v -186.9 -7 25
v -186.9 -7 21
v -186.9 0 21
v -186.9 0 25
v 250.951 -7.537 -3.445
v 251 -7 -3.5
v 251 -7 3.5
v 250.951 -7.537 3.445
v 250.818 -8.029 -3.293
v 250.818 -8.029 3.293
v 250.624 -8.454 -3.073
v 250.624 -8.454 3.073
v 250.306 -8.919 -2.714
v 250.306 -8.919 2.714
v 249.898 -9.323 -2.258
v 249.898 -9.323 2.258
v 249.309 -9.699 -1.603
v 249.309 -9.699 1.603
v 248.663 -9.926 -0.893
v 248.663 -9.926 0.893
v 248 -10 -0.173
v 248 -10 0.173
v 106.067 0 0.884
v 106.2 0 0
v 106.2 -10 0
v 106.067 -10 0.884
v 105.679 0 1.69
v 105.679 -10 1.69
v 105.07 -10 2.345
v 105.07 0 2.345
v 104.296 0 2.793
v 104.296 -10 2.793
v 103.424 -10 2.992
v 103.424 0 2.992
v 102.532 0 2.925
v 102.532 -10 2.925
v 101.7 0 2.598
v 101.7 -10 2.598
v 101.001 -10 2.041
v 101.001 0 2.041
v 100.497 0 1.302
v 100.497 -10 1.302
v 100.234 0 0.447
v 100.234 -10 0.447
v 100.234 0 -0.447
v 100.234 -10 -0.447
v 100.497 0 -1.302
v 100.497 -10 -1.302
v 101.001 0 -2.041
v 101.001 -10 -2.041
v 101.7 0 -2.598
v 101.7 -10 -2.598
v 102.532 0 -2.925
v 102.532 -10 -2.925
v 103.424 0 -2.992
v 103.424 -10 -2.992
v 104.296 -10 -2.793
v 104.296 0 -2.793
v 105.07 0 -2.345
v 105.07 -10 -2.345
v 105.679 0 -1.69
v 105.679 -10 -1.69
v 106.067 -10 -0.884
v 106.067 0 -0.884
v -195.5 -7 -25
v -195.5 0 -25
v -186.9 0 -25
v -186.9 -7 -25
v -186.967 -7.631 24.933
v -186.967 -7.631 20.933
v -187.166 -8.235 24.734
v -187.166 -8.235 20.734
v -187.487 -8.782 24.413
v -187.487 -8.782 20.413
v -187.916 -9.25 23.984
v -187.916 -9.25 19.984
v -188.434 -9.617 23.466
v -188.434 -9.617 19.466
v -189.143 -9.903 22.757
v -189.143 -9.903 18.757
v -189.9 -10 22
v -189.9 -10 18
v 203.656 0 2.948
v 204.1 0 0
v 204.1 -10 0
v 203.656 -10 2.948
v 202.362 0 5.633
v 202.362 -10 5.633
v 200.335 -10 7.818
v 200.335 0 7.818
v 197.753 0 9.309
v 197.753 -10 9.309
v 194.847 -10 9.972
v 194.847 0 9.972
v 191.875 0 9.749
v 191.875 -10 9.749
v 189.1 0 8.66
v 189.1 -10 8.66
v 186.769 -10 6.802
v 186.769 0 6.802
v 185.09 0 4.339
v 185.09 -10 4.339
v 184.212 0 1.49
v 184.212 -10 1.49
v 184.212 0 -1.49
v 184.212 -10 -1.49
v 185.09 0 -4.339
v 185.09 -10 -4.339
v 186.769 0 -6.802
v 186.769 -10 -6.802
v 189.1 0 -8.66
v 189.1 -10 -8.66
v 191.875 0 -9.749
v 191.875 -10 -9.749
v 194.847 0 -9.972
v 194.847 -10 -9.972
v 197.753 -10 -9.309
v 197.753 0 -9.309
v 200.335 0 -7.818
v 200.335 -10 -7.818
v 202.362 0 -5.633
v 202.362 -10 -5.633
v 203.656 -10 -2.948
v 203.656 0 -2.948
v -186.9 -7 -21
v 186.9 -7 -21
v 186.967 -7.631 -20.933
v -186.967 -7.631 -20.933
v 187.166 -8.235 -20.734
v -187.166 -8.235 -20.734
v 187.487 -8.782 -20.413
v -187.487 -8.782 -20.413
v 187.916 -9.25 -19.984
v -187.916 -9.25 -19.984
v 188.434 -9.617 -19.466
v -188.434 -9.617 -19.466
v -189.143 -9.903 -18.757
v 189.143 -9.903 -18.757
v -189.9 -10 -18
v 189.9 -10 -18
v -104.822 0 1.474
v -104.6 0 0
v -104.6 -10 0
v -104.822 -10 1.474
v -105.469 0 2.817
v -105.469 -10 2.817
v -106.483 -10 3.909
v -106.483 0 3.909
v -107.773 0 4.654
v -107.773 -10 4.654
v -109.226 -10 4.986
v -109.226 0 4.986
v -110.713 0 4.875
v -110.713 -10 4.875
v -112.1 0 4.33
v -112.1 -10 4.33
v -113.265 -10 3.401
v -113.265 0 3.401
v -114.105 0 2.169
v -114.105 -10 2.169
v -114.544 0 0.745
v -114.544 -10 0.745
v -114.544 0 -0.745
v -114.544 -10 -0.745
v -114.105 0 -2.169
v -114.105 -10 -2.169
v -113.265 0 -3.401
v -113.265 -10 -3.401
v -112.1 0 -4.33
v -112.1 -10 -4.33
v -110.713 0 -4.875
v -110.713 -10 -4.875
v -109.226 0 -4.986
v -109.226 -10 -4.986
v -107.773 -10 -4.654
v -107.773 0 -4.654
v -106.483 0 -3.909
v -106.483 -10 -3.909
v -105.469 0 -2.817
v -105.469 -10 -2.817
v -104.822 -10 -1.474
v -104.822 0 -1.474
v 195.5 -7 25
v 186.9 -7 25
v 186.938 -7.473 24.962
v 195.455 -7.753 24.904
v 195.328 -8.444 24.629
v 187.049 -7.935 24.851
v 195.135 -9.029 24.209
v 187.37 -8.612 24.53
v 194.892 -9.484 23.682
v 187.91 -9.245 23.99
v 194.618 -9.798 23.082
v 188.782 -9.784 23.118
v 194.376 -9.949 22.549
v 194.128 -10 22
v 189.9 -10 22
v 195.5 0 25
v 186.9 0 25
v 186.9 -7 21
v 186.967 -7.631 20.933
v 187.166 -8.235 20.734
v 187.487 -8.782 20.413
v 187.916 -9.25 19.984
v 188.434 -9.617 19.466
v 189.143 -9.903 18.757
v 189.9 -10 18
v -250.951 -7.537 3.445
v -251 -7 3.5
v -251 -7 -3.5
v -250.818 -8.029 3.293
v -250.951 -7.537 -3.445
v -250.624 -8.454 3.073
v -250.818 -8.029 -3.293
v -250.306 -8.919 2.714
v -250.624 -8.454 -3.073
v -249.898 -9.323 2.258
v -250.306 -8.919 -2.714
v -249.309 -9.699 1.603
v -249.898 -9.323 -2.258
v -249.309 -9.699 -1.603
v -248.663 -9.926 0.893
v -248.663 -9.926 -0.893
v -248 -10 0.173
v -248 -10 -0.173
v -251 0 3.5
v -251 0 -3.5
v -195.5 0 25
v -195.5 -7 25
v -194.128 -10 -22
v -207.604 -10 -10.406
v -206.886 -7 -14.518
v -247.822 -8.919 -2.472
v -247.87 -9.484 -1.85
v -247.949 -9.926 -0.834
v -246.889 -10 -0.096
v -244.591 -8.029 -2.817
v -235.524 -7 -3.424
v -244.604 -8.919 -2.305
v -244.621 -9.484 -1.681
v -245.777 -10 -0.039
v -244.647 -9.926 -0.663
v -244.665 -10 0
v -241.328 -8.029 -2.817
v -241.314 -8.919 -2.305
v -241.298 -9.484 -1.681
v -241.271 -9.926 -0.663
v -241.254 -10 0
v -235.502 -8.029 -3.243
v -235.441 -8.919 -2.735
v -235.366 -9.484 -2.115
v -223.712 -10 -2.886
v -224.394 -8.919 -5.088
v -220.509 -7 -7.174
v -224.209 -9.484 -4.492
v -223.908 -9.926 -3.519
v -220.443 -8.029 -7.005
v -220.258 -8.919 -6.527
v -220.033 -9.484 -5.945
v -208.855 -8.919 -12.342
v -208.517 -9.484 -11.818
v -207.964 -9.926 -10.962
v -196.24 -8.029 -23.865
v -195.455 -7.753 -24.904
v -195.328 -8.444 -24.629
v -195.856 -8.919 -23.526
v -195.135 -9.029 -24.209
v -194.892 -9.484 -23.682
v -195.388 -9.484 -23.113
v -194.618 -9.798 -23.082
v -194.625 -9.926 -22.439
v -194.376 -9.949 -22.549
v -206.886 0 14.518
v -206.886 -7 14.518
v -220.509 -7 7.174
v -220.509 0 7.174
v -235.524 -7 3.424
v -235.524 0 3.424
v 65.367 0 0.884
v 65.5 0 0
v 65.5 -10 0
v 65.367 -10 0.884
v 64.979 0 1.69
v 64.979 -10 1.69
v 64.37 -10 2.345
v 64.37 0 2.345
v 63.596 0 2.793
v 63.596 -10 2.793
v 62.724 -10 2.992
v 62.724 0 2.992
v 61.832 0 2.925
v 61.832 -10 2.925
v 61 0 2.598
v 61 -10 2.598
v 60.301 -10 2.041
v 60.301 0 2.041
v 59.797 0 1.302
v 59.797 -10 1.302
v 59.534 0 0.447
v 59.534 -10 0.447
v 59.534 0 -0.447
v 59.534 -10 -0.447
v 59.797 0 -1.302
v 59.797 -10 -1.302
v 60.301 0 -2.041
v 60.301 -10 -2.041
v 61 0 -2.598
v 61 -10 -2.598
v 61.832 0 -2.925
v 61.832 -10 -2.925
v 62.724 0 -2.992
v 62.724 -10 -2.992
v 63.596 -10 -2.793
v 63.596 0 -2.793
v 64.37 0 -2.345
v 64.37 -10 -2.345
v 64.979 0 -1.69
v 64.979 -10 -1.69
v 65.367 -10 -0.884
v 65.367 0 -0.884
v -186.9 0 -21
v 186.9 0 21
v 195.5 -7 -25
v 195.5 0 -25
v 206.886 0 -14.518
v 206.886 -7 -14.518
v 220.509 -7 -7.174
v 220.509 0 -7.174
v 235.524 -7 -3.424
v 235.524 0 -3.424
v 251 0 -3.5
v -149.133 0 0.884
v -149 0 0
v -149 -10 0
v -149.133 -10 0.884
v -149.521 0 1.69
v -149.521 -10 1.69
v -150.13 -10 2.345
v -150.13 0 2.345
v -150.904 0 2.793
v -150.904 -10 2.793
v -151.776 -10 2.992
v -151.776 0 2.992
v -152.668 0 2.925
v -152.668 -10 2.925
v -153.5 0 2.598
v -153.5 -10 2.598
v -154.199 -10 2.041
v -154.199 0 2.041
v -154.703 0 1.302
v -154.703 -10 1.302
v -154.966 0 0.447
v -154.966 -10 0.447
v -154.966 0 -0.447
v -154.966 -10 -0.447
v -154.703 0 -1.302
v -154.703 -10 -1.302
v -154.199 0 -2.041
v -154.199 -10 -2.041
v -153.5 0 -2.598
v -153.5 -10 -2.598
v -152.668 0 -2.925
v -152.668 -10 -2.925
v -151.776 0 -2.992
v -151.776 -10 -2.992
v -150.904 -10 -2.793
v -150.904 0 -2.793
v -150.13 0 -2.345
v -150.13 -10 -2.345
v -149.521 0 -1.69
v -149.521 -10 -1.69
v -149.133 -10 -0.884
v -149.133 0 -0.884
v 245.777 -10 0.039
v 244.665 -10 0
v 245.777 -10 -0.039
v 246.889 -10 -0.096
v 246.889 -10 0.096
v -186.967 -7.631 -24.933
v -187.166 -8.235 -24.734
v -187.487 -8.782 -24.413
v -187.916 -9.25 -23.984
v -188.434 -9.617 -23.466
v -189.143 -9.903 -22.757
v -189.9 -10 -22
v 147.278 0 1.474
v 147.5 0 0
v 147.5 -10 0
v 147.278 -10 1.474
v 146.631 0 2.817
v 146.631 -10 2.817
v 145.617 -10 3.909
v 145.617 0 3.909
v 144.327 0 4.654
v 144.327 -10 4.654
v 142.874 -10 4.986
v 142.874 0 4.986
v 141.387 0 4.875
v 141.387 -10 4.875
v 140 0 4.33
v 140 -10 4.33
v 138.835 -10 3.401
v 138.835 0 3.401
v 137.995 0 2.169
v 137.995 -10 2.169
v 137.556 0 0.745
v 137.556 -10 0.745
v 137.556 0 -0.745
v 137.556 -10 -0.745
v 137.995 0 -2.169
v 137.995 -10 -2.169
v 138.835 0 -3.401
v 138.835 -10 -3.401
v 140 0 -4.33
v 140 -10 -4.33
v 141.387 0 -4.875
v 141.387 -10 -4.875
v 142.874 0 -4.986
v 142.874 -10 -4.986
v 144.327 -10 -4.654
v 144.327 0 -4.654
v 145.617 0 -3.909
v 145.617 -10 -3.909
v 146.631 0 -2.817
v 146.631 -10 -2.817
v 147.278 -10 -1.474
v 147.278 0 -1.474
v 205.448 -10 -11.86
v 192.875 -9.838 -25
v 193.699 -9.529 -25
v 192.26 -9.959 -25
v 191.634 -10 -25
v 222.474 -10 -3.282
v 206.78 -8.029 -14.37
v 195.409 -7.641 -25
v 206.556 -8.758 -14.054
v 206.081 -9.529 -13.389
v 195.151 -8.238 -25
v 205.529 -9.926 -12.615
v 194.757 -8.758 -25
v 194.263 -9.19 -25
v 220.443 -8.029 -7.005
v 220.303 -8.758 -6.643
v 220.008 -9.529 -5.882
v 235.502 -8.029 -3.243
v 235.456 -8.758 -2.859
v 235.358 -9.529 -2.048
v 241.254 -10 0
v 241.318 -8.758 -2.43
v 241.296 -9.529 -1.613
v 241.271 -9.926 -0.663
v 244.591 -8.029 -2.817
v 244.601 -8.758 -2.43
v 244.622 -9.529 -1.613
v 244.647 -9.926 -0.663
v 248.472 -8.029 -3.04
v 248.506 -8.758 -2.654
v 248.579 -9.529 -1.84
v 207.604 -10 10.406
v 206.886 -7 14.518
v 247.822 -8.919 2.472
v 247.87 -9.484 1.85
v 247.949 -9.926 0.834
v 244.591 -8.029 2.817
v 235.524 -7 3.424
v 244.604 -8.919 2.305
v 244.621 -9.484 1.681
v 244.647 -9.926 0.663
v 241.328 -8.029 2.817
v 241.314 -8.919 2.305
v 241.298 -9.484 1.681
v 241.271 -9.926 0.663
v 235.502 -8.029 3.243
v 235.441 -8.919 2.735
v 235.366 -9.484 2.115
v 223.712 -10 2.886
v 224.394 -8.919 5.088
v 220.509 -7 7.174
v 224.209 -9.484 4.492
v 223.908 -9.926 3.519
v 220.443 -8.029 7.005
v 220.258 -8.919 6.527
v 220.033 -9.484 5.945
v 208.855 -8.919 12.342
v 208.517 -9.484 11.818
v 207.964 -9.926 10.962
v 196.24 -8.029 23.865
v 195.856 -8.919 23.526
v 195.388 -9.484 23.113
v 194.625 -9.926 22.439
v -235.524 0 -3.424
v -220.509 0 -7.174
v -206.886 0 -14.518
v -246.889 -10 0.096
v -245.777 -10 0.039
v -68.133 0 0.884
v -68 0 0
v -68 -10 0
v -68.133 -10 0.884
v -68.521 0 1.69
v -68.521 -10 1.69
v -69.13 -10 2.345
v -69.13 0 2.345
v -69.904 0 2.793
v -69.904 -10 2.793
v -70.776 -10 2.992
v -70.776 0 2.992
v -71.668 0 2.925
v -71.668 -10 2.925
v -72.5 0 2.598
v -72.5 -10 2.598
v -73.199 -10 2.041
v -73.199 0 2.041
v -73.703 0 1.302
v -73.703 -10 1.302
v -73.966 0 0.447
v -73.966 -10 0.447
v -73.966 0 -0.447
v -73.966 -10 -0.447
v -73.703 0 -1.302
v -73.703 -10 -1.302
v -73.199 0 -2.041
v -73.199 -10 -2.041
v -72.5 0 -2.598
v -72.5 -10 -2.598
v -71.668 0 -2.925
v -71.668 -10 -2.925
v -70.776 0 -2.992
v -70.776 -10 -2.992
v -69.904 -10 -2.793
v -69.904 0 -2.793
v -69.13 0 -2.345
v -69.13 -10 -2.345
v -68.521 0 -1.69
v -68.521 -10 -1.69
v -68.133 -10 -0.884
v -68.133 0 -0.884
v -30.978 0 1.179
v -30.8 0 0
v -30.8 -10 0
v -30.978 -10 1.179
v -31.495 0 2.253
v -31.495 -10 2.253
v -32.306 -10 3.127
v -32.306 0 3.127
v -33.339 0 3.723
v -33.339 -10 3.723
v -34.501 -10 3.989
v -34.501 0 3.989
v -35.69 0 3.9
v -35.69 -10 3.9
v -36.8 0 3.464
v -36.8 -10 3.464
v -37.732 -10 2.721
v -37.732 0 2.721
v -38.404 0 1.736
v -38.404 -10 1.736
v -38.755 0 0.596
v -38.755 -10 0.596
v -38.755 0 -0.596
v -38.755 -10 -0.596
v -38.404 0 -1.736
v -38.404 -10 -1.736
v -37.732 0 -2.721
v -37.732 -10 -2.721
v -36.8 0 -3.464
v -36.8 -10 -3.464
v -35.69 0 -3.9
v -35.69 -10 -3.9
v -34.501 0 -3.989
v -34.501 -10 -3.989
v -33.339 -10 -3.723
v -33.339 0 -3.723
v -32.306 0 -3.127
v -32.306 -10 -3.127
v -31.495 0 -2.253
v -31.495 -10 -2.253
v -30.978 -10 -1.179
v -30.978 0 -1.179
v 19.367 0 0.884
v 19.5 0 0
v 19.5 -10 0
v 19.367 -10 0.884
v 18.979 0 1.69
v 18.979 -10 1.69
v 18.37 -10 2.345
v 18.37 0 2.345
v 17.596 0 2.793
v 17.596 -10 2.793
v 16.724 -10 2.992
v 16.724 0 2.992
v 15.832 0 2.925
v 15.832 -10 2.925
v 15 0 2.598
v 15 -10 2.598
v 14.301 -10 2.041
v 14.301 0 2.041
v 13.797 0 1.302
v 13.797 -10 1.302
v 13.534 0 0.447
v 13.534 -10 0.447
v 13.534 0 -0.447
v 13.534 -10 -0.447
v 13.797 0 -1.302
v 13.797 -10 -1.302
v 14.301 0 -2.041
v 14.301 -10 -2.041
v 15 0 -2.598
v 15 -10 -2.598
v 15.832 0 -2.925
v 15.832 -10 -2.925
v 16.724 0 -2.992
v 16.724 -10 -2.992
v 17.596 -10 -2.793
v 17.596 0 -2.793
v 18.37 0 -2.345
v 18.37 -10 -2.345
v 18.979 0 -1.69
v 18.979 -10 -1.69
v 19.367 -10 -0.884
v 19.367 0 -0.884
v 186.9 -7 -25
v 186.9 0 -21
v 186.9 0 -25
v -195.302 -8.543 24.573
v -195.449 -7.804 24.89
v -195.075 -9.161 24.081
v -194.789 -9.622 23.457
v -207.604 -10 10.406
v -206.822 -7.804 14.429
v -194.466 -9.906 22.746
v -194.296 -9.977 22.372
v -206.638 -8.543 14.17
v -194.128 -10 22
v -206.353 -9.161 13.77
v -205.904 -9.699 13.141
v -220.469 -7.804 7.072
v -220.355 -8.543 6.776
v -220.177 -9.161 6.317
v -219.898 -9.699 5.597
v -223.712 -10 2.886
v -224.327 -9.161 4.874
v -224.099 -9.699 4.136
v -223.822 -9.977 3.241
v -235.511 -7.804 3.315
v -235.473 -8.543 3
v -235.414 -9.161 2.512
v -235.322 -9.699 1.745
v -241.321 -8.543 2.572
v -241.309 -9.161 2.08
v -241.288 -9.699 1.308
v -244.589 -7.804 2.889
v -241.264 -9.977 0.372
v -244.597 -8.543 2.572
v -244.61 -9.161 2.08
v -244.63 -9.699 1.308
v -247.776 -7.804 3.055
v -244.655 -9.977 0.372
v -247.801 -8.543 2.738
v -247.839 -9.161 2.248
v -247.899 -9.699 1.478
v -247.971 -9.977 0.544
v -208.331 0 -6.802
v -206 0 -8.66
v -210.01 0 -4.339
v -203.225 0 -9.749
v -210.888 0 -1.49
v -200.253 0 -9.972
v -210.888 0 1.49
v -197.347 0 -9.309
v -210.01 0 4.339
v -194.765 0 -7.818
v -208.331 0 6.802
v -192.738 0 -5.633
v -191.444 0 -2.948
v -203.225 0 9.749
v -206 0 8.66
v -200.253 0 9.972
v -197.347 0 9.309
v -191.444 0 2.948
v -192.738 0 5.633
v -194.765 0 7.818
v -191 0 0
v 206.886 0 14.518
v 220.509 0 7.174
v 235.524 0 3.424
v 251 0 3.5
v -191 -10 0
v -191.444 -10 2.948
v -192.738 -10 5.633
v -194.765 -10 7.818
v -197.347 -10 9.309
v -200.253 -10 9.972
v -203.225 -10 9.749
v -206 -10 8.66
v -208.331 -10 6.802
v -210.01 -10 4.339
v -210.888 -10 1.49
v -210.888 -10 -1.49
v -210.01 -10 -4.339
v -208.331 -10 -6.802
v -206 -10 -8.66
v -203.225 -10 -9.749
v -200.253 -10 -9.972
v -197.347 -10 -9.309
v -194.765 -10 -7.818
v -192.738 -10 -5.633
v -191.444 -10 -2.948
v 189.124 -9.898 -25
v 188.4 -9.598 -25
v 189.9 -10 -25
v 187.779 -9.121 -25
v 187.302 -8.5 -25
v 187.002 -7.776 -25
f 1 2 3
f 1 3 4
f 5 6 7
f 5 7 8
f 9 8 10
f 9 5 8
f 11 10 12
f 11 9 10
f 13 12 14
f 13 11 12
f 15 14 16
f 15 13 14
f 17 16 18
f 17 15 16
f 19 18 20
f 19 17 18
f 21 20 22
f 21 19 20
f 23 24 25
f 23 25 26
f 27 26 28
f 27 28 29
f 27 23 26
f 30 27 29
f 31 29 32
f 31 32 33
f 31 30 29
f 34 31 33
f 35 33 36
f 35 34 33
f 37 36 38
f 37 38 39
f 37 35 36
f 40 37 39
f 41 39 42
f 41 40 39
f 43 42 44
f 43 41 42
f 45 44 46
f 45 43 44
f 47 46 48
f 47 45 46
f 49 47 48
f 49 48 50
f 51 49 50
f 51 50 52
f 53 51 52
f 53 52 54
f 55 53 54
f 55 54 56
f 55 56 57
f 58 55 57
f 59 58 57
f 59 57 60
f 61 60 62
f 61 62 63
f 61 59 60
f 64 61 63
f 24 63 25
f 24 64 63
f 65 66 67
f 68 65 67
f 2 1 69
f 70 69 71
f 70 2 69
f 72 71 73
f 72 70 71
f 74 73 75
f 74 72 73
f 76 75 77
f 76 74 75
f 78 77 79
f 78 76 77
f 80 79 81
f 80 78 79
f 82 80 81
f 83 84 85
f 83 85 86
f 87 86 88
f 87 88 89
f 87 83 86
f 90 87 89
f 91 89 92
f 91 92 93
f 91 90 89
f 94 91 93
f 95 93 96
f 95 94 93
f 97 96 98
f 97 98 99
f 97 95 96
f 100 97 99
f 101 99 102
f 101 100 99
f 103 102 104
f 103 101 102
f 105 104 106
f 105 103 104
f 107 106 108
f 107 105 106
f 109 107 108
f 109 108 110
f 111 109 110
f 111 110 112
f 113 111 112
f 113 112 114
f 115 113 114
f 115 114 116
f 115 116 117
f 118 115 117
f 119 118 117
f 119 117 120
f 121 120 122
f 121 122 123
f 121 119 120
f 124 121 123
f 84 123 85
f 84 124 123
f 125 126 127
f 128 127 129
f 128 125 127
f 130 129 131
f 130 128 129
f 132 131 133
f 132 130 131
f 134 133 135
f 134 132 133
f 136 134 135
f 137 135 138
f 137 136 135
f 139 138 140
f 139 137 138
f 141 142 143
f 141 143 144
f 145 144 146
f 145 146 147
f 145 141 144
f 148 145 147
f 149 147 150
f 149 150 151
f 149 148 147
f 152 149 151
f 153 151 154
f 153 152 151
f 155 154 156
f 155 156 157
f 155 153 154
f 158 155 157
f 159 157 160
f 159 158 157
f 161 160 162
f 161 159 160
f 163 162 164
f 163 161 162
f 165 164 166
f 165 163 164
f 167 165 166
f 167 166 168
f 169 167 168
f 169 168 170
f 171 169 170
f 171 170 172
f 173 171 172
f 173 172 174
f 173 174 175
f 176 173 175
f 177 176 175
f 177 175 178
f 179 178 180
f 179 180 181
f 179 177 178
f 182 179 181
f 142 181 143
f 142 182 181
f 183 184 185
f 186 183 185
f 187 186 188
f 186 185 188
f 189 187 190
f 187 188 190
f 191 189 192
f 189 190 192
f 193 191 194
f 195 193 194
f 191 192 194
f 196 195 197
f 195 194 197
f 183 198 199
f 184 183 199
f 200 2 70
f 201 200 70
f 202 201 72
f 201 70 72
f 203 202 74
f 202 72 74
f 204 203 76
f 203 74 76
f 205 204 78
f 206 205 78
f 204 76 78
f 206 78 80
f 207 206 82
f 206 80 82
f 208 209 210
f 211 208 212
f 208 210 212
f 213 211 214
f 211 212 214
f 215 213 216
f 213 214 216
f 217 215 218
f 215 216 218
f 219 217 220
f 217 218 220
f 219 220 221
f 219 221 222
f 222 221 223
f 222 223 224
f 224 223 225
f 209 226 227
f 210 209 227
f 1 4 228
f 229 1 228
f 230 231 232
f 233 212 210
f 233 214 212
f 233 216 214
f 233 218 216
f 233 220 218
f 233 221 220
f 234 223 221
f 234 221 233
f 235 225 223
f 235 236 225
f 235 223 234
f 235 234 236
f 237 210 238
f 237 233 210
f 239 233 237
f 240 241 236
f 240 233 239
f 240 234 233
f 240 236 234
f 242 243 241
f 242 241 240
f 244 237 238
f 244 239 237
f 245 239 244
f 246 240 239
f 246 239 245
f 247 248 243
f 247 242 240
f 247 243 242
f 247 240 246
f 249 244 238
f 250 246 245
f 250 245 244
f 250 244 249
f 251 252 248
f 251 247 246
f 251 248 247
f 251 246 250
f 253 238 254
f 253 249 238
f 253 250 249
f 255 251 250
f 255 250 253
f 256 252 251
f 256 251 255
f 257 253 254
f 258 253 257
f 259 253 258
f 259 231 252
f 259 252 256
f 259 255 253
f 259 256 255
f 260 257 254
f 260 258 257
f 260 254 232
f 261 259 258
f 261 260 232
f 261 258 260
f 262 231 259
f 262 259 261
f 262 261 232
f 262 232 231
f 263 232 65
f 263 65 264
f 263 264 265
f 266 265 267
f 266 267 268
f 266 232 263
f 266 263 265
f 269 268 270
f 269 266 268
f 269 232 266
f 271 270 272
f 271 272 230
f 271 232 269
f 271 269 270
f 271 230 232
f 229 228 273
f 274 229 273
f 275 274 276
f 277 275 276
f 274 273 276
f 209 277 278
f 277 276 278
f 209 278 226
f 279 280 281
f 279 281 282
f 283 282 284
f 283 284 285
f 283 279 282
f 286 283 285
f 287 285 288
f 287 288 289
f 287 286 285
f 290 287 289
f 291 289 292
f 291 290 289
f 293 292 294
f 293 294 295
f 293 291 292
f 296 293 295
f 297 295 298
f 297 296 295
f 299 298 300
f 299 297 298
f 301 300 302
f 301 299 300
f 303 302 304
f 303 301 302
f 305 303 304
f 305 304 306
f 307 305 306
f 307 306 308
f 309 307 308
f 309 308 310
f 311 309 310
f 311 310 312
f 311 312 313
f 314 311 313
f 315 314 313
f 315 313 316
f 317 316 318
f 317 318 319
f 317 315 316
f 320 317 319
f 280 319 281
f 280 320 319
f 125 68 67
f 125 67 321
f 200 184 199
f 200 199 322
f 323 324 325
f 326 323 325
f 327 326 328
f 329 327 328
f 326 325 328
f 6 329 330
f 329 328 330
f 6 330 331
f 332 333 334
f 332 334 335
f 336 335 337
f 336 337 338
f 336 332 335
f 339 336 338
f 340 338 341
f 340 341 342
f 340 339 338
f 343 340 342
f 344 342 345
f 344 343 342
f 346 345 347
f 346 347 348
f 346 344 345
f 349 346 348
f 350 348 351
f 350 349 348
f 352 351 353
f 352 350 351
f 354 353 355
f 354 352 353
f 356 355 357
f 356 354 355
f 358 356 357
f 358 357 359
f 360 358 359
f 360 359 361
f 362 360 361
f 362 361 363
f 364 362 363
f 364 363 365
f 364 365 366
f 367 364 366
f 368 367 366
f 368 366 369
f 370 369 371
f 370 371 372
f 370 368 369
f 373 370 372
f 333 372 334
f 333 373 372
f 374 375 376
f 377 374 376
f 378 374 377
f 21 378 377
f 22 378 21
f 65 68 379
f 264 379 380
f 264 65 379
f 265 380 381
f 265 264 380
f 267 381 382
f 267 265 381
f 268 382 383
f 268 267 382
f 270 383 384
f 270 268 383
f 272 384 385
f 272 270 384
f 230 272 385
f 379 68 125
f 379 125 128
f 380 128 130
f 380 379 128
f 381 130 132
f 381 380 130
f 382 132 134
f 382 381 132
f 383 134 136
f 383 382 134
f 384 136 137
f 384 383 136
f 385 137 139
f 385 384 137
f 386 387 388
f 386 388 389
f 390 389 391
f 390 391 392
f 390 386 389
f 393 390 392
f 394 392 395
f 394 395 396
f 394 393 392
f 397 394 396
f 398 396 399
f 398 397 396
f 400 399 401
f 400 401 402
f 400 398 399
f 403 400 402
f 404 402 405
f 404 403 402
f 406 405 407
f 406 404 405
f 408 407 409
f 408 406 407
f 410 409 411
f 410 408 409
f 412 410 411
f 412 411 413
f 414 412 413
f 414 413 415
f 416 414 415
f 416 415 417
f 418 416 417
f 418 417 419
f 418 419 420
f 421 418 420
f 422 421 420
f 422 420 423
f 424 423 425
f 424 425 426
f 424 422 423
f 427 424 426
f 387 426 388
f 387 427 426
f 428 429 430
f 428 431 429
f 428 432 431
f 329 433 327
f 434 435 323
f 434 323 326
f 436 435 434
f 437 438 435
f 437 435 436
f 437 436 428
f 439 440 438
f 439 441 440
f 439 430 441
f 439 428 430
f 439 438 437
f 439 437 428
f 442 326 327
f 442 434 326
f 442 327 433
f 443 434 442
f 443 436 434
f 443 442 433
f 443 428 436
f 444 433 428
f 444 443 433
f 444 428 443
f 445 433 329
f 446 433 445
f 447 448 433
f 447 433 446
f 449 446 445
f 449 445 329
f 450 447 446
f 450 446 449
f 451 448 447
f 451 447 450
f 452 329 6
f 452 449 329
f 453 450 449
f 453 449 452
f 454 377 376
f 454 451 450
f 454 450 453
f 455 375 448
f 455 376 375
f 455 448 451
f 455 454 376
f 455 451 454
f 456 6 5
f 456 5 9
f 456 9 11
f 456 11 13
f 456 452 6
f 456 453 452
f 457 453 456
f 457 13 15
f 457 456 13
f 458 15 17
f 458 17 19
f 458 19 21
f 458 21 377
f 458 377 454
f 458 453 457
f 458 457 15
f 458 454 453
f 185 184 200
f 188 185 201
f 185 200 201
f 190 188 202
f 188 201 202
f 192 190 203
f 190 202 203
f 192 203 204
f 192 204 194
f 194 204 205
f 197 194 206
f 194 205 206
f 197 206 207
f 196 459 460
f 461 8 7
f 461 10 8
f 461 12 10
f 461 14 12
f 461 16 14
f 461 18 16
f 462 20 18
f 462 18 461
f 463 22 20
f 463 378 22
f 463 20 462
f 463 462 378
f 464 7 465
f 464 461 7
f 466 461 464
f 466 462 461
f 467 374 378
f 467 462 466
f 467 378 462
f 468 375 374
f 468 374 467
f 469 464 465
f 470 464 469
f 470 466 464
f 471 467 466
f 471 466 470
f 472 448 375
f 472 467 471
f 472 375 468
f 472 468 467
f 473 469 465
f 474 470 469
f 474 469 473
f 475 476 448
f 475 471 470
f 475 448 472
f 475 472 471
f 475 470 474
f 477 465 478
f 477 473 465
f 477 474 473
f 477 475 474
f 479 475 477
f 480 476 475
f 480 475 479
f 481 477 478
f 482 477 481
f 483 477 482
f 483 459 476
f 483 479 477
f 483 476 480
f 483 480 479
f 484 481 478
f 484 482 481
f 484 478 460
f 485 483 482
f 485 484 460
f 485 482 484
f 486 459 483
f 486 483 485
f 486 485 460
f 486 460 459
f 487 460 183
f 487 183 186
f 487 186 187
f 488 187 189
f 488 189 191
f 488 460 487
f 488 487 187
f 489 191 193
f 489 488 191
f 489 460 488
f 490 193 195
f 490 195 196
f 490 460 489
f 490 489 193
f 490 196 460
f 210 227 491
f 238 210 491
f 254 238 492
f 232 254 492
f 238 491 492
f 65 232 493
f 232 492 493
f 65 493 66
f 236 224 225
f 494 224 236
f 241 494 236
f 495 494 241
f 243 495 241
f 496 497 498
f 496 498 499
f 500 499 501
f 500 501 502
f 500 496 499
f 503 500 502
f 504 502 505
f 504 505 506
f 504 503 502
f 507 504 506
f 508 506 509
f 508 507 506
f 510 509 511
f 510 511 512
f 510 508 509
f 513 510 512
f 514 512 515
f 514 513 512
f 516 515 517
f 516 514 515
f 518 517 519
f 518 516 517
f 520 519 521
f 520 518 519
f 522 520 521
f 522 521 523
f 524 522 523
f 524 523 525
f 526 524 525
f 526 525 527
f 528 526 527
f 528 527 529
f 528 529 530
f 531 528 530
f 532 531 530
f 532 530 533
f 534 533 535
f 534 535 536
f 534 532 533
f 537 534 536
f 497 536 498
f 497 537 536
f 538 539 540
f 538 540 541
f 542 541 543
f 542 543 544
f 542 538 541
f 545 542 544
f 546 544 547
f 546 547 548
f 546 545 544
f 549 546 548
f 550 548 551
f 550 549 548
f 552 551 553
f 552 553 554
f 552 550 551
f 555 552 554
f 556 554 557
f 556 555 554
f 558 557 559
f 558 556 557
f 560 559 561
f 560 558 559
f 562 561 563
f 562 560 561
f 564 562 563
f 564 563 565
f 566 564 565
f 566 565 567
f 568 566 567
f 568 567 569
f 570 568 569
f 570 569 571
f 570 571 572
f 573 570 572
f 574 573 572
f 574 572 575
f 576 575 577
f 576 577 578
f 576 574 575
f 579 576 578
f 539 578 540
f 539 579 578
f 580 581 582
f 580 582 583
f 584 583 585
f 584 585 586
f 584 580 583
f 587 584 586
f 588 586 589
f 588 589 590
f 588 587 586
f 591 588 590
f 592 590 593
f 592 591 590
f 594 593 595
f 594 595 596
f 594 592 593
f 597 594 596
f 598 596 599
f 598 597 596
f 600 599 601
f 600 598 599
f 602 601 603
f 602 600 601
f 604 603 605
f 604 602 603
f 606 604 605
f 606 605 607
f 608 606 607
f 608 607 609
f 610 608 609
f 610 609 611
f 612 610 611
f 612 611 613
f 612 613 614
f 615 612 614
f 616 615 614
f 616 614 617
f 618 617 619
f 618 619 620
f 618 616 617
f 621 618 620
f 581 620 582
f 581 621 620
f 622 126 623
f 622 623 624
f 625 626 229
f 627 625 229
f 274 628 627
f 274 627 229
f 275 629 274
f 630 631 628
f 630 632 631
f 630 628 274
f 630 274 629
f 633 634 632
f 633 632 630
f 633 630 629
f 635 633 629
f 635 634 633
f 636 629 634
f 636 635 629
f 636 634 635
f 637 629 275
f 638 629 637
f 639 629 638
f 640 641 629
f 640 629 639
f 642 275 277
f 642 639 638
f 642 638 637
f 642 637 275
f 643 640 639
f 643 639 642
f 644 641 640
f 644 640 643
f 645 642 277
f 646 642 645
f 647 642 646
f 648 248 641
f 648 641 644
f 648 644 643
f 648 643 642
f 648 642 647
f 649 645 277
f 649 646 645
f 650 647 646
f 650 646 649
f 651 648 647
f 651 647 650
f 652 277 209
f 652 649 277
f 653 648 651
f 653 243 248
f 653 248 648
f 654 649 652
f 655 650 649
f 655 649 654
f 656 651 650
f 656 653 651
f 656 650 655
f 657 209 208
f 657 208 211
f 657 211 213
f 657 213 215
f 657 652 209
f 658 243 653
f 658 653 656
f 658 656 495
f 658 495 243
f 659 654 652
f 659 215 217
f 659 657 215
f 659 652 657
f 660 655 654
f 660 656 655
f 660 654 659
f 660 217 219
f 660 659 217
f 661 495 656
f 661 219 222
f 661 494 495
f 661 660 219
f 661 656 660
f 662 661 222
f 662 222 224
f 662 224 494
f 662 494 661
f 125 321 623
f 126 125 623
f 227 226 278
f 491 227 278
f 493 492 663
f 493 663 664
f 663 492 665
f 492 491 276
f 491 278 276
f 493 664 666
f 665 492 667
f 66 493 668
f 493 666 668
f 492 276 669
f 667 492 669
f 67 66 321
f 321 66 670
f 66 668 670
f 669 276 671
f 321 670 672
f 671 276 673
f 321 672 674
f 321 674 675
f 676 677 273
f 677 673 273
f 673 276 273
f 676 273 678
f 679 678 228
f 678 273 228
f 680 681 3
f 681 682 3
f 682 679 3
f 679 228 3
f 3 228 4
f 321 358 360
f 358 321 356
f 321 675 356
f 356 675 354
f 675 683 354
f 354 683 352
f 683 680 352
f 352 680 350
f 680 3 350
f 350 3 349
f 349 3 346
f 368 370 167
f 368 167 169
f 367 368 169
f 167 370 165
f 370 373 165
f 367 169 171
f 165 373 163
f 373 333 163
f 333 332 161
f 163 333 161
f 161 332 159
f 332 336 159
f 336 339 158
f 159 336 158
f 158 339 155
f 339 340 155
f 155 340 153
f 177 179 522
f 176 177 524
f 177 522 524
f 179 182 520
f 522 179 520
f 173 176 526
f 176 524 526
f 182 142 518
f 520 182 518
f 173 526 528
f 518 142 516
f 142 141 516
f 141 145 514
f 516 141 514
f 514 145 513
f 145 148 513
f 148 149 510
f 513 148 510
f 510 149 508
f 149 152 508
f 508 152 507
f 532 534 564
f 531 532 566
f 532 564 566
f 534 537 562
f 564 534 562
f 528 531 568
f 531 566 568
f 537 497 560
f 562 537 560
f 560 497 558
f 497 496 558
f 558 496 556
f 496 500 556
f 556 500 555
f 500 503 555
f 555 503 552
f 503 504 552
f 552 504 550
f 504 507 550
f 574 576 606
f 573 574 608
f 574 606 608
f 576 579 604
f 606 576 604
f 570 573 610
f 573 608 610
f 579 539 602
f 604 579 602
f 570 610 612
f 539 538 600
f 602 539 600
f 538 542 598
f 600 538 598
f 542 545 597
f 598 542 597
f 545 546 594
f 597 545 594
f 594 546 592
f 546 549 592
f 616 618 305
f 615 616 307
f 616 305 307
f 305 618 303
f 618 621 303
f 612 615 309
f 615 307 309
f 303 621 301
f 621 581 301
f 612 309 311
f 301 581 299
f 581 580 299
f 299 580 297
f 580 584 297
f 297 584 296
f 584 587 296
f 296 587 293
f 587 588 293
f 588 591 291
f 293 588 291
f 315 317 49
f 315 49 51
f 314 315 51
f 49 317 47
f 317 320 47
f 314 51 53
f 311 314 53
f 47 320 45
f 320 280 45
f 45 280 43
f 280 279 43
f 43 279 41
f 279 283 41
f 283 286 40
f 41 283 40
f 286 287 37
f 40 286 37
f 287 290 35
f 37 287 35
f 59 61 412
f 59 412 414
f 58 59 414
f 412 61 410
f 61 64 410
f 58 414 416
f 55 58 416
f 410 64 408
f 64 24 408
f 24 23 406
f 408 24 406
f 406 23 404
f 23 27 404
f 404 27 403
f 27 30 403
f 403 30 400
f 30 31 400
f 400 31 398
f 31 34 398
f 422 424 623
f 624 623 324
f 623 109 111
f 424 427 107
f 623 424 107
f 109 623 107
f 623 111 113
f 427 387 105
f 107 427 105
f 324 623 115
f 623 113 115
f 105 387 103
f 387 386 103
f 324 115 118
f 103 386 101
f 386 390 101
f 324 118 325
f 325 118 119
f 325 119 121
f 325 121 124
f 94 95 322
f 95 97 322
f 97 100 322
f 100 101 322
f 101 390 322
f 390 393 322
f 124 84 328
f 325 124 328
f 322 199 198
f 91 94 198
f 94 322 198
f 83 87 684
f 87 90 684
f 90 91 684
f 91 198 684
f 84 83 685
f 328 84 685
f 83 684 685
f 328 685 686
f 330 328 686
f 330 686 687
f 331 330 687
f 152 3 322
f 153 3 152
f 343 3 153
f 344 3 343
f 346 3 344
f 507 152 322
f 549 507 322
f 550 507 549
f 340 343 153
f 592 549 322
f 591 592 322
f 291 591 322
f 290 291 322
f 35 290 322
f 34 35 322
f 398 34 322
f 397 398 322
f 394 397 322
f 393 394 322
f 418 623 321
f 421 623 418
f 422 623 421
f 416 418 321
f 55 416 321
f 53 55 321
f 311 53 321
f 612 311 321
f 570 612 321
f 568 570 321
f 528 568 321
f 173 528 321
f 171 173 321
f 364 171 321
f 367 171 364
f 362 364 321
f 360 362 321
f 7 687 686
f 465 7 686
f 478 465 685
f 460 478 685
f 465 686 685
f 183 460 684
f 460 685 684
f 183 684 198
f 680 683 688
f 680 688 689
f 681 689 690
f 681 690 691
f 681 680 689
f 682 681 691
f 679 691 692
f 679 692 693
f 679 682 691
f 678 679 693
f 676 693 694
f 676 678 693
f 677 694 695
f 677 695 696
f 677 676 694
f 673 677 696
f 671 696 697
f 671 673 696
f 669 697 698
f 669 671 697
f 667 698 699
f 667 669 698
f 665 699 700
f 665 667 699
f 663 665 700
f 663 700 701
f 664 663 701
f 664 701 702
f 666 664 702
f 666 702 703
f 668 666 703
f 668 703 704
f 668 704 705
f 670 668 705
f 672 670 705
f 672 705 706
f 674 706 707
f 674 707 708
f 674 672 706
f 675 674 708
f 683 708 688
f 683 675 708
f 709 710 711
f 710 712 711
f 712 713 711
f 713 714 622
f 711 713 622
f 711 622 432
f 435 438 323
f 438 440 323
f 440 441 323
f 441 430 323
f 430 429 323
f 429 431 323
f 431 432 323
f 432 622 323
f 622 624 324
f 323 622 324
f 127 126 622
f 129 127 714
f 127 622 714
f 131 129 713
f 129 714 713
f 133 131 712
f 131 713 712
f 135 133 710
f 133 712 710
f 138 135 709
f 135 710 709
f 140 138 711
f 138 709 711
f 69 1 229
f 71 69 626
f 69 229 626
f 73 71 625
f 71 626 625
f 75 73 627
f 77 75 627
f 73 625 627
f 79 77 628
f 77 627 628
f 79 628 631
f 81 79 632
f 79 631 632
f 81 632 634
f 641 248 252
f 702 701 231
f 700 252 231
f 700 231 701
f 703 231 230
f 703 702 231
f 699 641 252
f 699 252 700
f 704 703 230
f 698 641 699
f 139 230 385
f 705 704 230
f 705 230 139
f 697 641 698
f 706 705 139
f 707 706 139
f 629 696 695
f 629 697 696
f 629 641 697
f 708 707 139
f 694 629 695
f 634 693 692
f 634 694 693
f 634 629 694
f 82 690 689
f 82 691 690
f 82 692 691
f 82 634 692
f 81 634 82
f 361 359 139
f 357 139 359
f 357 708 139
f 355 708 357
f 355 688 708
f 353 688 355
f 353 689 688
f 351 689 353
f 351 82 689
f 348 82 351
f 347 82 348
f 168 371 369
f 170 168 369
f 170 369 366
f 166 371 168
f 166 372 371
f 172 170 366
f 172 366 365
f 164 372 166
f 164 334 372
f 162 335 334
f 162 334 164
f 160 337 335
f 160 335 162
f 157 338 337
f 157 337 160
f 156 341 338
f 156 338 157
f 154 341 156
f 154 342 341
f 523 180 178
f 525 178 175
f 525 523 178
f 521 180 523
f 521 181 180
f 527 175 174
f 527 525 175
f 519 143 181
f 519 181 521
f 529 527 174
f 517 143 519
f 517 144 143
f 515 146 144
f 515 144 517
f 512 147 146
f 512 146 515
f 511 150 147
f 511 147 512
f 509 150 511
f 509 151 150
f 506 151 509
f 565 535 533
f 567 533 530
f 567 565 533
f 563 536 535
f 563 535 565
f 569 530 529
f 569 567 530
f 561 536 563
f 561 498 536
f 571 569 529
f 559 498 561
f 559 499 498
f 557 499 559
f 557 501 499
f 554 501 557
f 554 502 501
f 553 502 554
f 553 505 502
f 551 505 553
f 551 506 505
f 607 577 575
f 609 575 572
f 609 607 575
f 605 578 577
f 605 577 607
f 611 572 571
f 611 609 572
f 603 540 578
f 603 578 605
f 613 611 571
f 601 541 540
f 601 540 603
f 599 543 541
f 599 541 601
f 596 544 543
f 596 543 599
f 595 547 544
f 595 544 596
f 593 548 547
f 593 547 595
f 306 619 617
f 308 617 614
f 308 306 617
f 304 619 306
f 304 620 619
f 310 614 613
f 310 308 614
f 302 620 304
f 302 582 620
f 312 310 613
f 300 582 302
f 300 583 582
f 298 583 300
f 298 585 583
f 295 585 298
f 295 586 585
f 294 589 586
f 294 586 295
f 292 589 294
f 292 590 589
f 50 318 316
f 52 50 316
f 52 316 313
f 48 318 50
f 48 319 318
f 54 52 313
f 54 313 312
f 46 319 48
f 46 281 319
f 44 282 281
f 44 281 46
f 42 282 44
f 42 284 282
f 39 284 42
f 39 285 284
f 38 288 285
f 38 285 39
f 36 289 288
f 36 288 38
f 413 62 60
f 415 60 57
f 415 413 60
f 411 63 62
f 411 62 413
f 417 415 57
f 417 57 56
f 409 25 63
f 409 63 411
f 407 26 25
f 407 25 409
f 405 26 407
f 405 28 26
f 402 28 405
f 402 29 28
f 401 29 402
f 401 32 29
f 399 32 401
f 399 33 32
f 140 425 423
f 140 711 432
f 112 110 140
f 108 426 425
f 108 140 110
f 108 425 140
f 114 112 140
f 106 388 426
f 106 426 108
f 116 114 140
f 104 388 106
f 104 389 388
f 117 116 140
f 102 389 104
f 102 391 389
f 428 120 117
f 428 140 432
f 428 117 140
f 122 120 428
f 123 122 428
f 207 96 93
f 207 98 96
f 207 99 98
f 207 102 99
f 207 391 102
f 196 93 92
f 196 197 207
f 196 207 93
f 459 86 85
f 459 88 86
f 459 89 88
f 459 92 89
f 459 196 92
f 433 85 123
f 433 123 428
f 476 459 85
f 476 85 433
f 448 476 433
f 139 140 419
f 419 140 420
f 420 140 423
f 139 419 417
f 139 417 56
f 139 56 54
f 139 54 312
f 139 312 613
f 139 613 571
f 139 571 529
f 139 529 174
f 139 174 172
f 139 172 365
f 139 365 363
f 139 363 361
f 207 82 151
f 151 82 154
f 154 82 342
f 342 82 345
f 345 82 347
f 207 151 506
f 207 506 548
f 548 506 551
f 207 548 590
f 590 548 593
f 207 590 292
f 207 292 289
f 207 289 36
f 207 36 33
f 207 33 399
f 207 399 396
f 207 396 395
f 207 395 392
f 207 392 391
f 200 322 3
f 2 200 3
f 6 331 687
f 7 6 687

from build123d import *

# Parameters (mm, degrees)
F0_R         = 10
F0_R_2       = 3
F0_R_3       = 5
F0_R_4       = 4
F1_DEPTH     = 10
F2_T1_DEPTH  = 22
F2_T3_DEPTH  = 23.6
F2_T5_DEPTH  = 11.5
F2_T7_DEPTH  = 373.8
F2_T9_DEPTH  = 11.5
F2_T11_DEPTH = 23.6
F2_T14_ANGLE = 71.0490813257
F2_T16_ANGLE = 71.0490813257
F2_T18_ANGLE = 71.0490813257
F2_T20_ANGLE = 71.0490813257
F2_T25_DEPTH = 19
F2_T29_DEPTH = 381.3
F2_T36_DEPTH = 381.3
F2_T40_DEPTH = 19
F2_T47_DEPTH = 19
F2_T51_DEPTH = 381.3
F2_T58_DEPTH = 381.3
F2_T62_DEPTH = 19


# Not quite as in the source:
# - a fillet or chamfer that OpenCascade refuses, or shapes differently, is made with other operations: its cross-section is extruded or revolved along the edge and cut away or added


with BuildPart() as f1:
    # F0 (on Front) → F1 (new body)
    with BuildSketch(Plane.XZ):
        with BuildLine():
            ThreePointArc((251, 3.5), (220.5089399385, 7.1742403064), (195.5, 25))
            Line((195.5, 25), (186.9, 25))
            Line((186.9, 25), (186.9, 21))
            Line((186.9, 21), (-186.9, 21))
            Line((-186.9, 21), (-186.9, 25))
            Line((-186.9, 25), (-195.5, 25))
            ThreePointArc((-195.5, 25), (-220.5089399385, 7.1742403064), (-251, 3.5))
            Line((-251, 3.5), (-251, -3.5))
            ThreePointArc((-251, -3.5), (-220.5089399385, -7.1742403064), (-195.5, -25))
            Line((-195.5, -25), (-186.9, -25))
            Line((-186.9, -25), (-186.9, -21))
            Line((-186.9, -21), (186.9, -21))
            Line((186.9, -21), (186.9, -25))
            Line((186.9, -25), (195.5, -25))
            ThreePointArc((195.5, -25), (220.5089399385, -7.1742403064), (251, -3.5))
            Line((251, -3.5), (251, 3.5))
        make_face()
        with Locations((-201, 0)):
            Circle(F0_R, mode=Mode.SUBTRACT)
        with Locations((-152, 0)):
            Circle(F0_R_2, mode=Mode.SUBTRACT)
        with Locations((-109.6, 0)):
            Circle(F0_R_3, mode=Mode.SUBTRACT)
        with Locations((-71, 0)):
            Circle(F0_R_2, mode=Mode.SUBTRACT)
        with Locations((-34.8, 0)):
            Circle(F0_R_4, mode=Mode.SUBTRACT)
        with Locations((16.5, 0)):
            Circle(F0_R_2, mode=Mode.SUBTRACT)
        with Locations((62.5, 0)):
            Circle(F0_R_2, mode=Mode.SUBTRACT)
        with Locations((103.2, 0)):
            Circle(F0_R_2, mode=Mode.SUBTRACT)
        with Locations((142.5, 0)):
            Circle(F0_R_3, mode=Mode.SUBTRACT)
        with Locations((194.1, 0)):
            Circle(F0_R, mode=Mode.SUBTRACT)
    extrude(amount=F1_DEPTH)

    # F2: fillet of radius 3 on 15 edges, made by hand

    # F2_s2 → F2_t1 (cut)
    with BuildSketch(Plane.XY.offset(-11)):
        with BuildLine():
            ThreePointArc((251, -7), (250.1213203436, -9.1213203436), (248, -10))
            Line((248, -10), (251, -10))
            Line((251, -10), (251, -7))
        make_face()
        with BuildLine():
            ThreePointArc((-251, -7), (-250.1213203436, -9.1213203436), (-248, -10))
            Line((-248, -10), (-251, -10))
            Line((-251, -10), (-251, -7))
        make_face()
    extrude(amount=F2_T1_DEPTH, mode=Mode.SUBTRACT)

    # F2_s4 → F2_t3 (cut)
    with BuildSketch(Plane.YZ.offset(179.4)):
        with BuildLine():
            ThreePointArc((-7, 25), (-9.1213203436, 24.1213203436), (-10, 22))
            Line((-10, 22), (-10, 25))
            Line((-10, 25), (-7, 25))
        make_face()
    extrude(amount=F2_T3_DEPTH, mode=Mode.SUBTRACT)

    # F2_s6 → F2_t5 (cut)
    with BuildSketch(Plane.XY.offset(21)):
        with BuildLine():
            ThreePointArc((186.9, -7), (187.7786796564, -9.1213203436), (189.9, -10))
            Line((189.9, -10), (186.9, -10))
            Line((186.9, -10), (186.9, -7))
        make_face()
        with BuildLine():
            ThreePointArc((-186.9, -7), (-187.7786796564, -9.1213203436), (-189.9, -10))
            Line((-189.9, -10), (-186.9, -10))
            Line((-186.9, -10), (-186.9, -7))
        make_face()
    extrude(amount=F2_T5_DEPTH, mode=Mode.SUBTRACT)

    # F2_s8 → F2_t7 (cut)
    with BuildSketch(Plane.YZ.offset(-186.9)):
        with BuildLine():
            ThreePointArc((-7, 21), (-9.1213203436, 20.1213203436), (-10, 18))
            Line((-10, 18), (-10, 21))
            Line((-10, 21), (-7, 21))
        make_face()
        with BuildLine():
            ThreePointArc((-7, -21), (-9.1213203436, -20.1213203436), (-10, -18))
            Line((-10, -18), (-10, -21))
            Line((-10, -21), (-7, -21))
        make_face()
    extrude(amount=F2_T7_DEPTH, mode=Mode.SUBTRACT)

    # F2_s10 → F2_t9 (cut)
    with BuildSketch(Plane.XY.offset(-32.5)):
        with BuildLine():
            ThreePointArc((186.9, -7), (187.7786796564, -9.1213203436), (189.9, -10))
            Line((189.9, -10), (186.9, -10))
            Line((186.9, -10), (186.9, -7))
        make_face()
        with BuildLine():
            ThreePointArc((-186.9, -7), (-187.7786796564, -9.1213203436), (-189.9, -10))
            Line((-189.9, -10), (-186.9, -10))
            Line((-186.9, -10), (-186.9, -7))
        make_face()
    extrude(amount=F2_T9_DEPTH, mode=Mode.SUBTRACT)

    # F2_s12 → F2_t11 (cut)
    with BuildSketch(Plane.YZ.offset(-203)):
        with BuildLine():
            ThreePointArc((-7, 25), (-9.1213203436, 24.1213203436), (-10, 22))
            Line((-10, 22), (-10, 25))
            Line((-10, 25), (-7, 25))
        make_face()
        with BuildLine():
            ThreePointArc((-7, -25), (-9.1213203436, -24.1213203436), (-10, -22))
            Line((-10, -22), (-10, -25))
            Line((-10, -25), (-7, -25))
        make_face()
    extrude(amount=F2_T11_DEPTH, mode=Mode.SUBTRACT)

    # F2_s13 → F2_t14 (revolve, cut)
    with BuildSketch(Plane(origin=(243.6742780769, 0, 62.3328752784), x_dir=(0, 1, 0), z_dir=(0.9688050004, 0, 0.2478242748))):
        with BuildLine():
            ThreePointArc((-7, -59.2652075087), (-9.1213203436, -60.1438871651), (-10, -62.2652075087))
            Line((-10, -62.2652075087), (-10, -59.2652075087))
            Line((-10, -59.2652075087), (-7, -59.2652075087))
        make_face()
    revolve(axis=Axis((242.9593619468, -10, 65.127655258), (0, 1, 0)), revolution_arc=F2_T14_ANGLE, mode=Mode.SUBTRACT)

    # F2_s15 → F2_t16 (revolve, cut)
    with BuildSketch(Plane(origin=(43.3477149421, 0, 65.9912921941), x_dir=(0, 1, 0), z_dir=(-0.5490187323, 0, -0.8358100452))):
        with BuildLine():
            ThreePointArc((-7, 176.6742001078), (-9.1213203436, 175.7955204514), (-10, 173.6742001078))
            Line((-10, 173.6742001078), (-10, 176.6742001078))
            Line((-10, 176.6742001078), (-7, 176.6742001078))
        make_face()
    revolve(axis=Axis((242.9593619468, -10, -65.127655258), (0, 1, 0)), revolution_arc=F2_T16_ANGLE, mode=Mode.SUBTRACT)

    # F2_s17 → F2_t18 (revolve, cut)
    with BuildSketch(Plane(origin=(-243.6742780769, 0, -62.3328752784), x_dir=(0, 1, 0), z_dir=(-0.9688050004, 0, -0.2478242748))):
        with BuildLine():
            ThreePointArc((-7, -59.2652075087), (-9.1213203436, -60.1438871651), (-10, -62.2652075087))
            Line((-10, -62.2652075087), (-10, -59.2652075087))
            Line((-10, -59.2652075087), (-7, -59.2652075087))
        make_face()
    revolve(axis=Axis((-242.9593619468, -10, -65.127655258), (0, 1, 0)), revolution_arc=F2_T18_ANGLE, mode=Mode.SUBTRACT)

    # F2_s19 → F2_t20 (revolve, cut)
    with BuildSketch(Plane(origin=(-43.3477149421, 0, -65.9912921941), x_dir=(0, 1, 0), z_dir=(0.5490187323, 0, 0.8358100452))):
        with BuildLine():
            ThreePointArc((-7, 176.6742001078), (-9.1213203436, 175.7955204514), (-10, 173.6742001078))
            Line((-10, 173.6742001078), (-10, 176.6742001078))
            Line((-10, 176.6742001078), (-7, 176.6742001078))
        make_face()
    revolve(axis=Axis((-242.9593619468, -10, 65.127655258), (0, 1, 0)), revolution_arc=F2_T20_ANGLE, mode=Mode.SUBTRACT)


with BuildPart() as f2_tool23:
    # F2_s24 → F2_t25 (new body)
    with BuildSketch(Plane.XY.offset(32.5)):
        with BuildLine():
            ThreePointArc((186.9, -7), (187.7786796564, -9.1213203436), (189.9, -10))
            Line((189.9, -10), (186.9, -10))
            Line((186.9, -10), (186.9, -7))
        make_face()
    extrude(amount=-F2_T25_DEPTH)

    split(bisect_by=Plane.XY.offset(21), keep=Keep.BOTTOM)


with BuildPart() as f2_tool27:
    # F2_s28 → F2_t29 (new body)
    with BuildSketch(Plane.YZ.offset(194.4)):
        with BuildLine():
            ThreePointArc((-7, 21), (-9.1213203436, 20.1213203436), (-10, 18))
            Line((-10, 18), (-10, 21))
            Line((-10, 21), (-7, 21))
        make_face()
    extrude(amount=-F2_T29_DEPTH)

    split(bisect_by=Plane.YZ.offset(186.9), keep=Keep.TOP)


with BuildPart() as f2_tool23_1:
    add(f2_tool23.part)

    # F2_t31: intersect F2_tool27
    add(f2_tool27.part, mode=Mode.INTERSECT)


with BuildPart() as f1_1:
    add(f1.part)

    # F2_t21: cut F2_tool23
    add(f2_tool23_1.part, mode=Mode.SUBTRACT)


with BuildPart() as f2_tool34:
    # F2_s35 → F2_t36 (new body)
    with BuildSketch(Plane.YZ.offset(186.9)):
        with BuildLine():
            ThreePointArc((-7, 21), (-9.1213203436, 20.1213203436), (-10, 18))
            Line((-10, 18), (-10, 21))
            Line((-10, 21), (-7, 21))
        make_face()
    extrude(amount=-F2_T36_DEPTH)

    split(bisect_by=Plane.YZ.offset(-186.9), keep=Keep.BOTTOM)


with BuildPart() as f2_tool38:
    # F2_s39 → F2_t40 (new body)
    with BuildSketch(Plane.XY.offset(13.5)):
        with BuildLine():
            ThreePointArc((-186.9, -7), (-187.7786796564, -9.1213203436), (-189.9, -10))
            Line((-189.9, -10), (-186.9, -10))
            Line((-186.9, -10), (-186.9, -7))
        make_face()
    extrude(amount=F2_T40_DEPTH)

    split(bisect_by=Plane.XY.offset(21), keep=Keep.BOTTOM)


with BuildPart() as f2_tool34_1:
    add(f2_tool34.part)

    # F2_t42: intersect F2_tool38
    add(f2_tool38.part, mode=Mode.INTERSECT)


with BuildPart() as f1_2:
    add(f1_1.part)

    # F2_t32: cut F2_tool34
    add(f2_tool34_1.part, mode=Mode.SUBTRACT)


with BuildPart() as f2_tool45:
    # F2_s46 → F2_t47 (new body)
    with BuildSketch(Plane.XY.offset(-32.5)):
        with BuildLine():
            ThreePointArc((-186.9, -7), (-187.7786796564, -9.1213203436), (-189.9, -10))
            Line((-189.9, -10), (-186.9, -10))
            Line((-186.9, -10), (-186.9, -7))
        make_face()
    extrude(amount=F2_T47_DEPTH)

    split(bisect_by=Plane.XY.offset(-21), keep=Keep.TOP)


with BuildPart() as f2_tool49:
    # F2_s50 → F2_t51 (new body)
    with BuildSketch(Plane.YZ.offset(-194.4)):
        with BuildLine():
            ThreePointArc((-7, -21), (-9.1213203436, -20.1213203436), (-10, -18))
            Line((-10, -18), (-10, -21))
            Line((-10, -21), (-7, -21))
        make_face()
    extrude(amount=F2_T51_DEPTH)

    split(bisect_by=Plane.YZ.offset(-186.9), keep=Keep.BOTTOM)


with BuildPart() as f2_tool45_1:
    add(f2_tool45.part)

    # F2_t53: intersect F2_tool49
    add(f2_tool49.part, mode=Mode.INTERSECT)


with BuildPart() as f1_3:
    add(f1_2.part)

    # F2_t43: cut F2_tool45
    add(f2_tool45_1.part, mode=Mode.SUBTRACT)


with BuildPart() as f2_tool56:
    # F2_s57 → F2_t58 (new body)
    with BuildSketch(Plane.YZ.offset(-186.9)):
        with BuildLine():
            ThreePointArc((-7, -21), (-9.1213203436, -20.1213203436), (-10, -18))
            Line((-10, -18), (-10, -21))
            Line((-10, -21), (-7, -21))
        make_face()
    extrude(amount=F2_T58_DEPTH)

    split(bisect_by=Plane.YZ.offset(186.9), keep=Keep.TOP)


with BuildPart() as f2_tool60:
    # F2_s61 → F2_t62 (new body)
    with BuildSketch(Plane.XY.offset(-13.5)):
        with BuildLine():
            ThreePointArc((186.9, -7), (187.7786796564, -9.1213203436), (189.9, -10))
            Line((189.9, -10), (186.9, -10))
            Line((186.9, -10), (186.9, -7))
        make_face()
    extrude(amount=-F2_T62_DEPTH)

    split(bisect_by=Plane.XY.offset(-21), keep=Keep.TOP)


with BuildPart() as f2_tool56_1:
    add(f2_tool56.part)

    # F2_t64: intersect F2_tool60
    add(f2_tool60.part, mode=Mode.INTERSECT)


with BuildPart() as f1_4:
    add(f1_3.part)

    # F2_t54: cut F2_tool56
    add(f2_tool56_1.part, mode=Mode.SUBTRACT)


solid = f1_4.part
